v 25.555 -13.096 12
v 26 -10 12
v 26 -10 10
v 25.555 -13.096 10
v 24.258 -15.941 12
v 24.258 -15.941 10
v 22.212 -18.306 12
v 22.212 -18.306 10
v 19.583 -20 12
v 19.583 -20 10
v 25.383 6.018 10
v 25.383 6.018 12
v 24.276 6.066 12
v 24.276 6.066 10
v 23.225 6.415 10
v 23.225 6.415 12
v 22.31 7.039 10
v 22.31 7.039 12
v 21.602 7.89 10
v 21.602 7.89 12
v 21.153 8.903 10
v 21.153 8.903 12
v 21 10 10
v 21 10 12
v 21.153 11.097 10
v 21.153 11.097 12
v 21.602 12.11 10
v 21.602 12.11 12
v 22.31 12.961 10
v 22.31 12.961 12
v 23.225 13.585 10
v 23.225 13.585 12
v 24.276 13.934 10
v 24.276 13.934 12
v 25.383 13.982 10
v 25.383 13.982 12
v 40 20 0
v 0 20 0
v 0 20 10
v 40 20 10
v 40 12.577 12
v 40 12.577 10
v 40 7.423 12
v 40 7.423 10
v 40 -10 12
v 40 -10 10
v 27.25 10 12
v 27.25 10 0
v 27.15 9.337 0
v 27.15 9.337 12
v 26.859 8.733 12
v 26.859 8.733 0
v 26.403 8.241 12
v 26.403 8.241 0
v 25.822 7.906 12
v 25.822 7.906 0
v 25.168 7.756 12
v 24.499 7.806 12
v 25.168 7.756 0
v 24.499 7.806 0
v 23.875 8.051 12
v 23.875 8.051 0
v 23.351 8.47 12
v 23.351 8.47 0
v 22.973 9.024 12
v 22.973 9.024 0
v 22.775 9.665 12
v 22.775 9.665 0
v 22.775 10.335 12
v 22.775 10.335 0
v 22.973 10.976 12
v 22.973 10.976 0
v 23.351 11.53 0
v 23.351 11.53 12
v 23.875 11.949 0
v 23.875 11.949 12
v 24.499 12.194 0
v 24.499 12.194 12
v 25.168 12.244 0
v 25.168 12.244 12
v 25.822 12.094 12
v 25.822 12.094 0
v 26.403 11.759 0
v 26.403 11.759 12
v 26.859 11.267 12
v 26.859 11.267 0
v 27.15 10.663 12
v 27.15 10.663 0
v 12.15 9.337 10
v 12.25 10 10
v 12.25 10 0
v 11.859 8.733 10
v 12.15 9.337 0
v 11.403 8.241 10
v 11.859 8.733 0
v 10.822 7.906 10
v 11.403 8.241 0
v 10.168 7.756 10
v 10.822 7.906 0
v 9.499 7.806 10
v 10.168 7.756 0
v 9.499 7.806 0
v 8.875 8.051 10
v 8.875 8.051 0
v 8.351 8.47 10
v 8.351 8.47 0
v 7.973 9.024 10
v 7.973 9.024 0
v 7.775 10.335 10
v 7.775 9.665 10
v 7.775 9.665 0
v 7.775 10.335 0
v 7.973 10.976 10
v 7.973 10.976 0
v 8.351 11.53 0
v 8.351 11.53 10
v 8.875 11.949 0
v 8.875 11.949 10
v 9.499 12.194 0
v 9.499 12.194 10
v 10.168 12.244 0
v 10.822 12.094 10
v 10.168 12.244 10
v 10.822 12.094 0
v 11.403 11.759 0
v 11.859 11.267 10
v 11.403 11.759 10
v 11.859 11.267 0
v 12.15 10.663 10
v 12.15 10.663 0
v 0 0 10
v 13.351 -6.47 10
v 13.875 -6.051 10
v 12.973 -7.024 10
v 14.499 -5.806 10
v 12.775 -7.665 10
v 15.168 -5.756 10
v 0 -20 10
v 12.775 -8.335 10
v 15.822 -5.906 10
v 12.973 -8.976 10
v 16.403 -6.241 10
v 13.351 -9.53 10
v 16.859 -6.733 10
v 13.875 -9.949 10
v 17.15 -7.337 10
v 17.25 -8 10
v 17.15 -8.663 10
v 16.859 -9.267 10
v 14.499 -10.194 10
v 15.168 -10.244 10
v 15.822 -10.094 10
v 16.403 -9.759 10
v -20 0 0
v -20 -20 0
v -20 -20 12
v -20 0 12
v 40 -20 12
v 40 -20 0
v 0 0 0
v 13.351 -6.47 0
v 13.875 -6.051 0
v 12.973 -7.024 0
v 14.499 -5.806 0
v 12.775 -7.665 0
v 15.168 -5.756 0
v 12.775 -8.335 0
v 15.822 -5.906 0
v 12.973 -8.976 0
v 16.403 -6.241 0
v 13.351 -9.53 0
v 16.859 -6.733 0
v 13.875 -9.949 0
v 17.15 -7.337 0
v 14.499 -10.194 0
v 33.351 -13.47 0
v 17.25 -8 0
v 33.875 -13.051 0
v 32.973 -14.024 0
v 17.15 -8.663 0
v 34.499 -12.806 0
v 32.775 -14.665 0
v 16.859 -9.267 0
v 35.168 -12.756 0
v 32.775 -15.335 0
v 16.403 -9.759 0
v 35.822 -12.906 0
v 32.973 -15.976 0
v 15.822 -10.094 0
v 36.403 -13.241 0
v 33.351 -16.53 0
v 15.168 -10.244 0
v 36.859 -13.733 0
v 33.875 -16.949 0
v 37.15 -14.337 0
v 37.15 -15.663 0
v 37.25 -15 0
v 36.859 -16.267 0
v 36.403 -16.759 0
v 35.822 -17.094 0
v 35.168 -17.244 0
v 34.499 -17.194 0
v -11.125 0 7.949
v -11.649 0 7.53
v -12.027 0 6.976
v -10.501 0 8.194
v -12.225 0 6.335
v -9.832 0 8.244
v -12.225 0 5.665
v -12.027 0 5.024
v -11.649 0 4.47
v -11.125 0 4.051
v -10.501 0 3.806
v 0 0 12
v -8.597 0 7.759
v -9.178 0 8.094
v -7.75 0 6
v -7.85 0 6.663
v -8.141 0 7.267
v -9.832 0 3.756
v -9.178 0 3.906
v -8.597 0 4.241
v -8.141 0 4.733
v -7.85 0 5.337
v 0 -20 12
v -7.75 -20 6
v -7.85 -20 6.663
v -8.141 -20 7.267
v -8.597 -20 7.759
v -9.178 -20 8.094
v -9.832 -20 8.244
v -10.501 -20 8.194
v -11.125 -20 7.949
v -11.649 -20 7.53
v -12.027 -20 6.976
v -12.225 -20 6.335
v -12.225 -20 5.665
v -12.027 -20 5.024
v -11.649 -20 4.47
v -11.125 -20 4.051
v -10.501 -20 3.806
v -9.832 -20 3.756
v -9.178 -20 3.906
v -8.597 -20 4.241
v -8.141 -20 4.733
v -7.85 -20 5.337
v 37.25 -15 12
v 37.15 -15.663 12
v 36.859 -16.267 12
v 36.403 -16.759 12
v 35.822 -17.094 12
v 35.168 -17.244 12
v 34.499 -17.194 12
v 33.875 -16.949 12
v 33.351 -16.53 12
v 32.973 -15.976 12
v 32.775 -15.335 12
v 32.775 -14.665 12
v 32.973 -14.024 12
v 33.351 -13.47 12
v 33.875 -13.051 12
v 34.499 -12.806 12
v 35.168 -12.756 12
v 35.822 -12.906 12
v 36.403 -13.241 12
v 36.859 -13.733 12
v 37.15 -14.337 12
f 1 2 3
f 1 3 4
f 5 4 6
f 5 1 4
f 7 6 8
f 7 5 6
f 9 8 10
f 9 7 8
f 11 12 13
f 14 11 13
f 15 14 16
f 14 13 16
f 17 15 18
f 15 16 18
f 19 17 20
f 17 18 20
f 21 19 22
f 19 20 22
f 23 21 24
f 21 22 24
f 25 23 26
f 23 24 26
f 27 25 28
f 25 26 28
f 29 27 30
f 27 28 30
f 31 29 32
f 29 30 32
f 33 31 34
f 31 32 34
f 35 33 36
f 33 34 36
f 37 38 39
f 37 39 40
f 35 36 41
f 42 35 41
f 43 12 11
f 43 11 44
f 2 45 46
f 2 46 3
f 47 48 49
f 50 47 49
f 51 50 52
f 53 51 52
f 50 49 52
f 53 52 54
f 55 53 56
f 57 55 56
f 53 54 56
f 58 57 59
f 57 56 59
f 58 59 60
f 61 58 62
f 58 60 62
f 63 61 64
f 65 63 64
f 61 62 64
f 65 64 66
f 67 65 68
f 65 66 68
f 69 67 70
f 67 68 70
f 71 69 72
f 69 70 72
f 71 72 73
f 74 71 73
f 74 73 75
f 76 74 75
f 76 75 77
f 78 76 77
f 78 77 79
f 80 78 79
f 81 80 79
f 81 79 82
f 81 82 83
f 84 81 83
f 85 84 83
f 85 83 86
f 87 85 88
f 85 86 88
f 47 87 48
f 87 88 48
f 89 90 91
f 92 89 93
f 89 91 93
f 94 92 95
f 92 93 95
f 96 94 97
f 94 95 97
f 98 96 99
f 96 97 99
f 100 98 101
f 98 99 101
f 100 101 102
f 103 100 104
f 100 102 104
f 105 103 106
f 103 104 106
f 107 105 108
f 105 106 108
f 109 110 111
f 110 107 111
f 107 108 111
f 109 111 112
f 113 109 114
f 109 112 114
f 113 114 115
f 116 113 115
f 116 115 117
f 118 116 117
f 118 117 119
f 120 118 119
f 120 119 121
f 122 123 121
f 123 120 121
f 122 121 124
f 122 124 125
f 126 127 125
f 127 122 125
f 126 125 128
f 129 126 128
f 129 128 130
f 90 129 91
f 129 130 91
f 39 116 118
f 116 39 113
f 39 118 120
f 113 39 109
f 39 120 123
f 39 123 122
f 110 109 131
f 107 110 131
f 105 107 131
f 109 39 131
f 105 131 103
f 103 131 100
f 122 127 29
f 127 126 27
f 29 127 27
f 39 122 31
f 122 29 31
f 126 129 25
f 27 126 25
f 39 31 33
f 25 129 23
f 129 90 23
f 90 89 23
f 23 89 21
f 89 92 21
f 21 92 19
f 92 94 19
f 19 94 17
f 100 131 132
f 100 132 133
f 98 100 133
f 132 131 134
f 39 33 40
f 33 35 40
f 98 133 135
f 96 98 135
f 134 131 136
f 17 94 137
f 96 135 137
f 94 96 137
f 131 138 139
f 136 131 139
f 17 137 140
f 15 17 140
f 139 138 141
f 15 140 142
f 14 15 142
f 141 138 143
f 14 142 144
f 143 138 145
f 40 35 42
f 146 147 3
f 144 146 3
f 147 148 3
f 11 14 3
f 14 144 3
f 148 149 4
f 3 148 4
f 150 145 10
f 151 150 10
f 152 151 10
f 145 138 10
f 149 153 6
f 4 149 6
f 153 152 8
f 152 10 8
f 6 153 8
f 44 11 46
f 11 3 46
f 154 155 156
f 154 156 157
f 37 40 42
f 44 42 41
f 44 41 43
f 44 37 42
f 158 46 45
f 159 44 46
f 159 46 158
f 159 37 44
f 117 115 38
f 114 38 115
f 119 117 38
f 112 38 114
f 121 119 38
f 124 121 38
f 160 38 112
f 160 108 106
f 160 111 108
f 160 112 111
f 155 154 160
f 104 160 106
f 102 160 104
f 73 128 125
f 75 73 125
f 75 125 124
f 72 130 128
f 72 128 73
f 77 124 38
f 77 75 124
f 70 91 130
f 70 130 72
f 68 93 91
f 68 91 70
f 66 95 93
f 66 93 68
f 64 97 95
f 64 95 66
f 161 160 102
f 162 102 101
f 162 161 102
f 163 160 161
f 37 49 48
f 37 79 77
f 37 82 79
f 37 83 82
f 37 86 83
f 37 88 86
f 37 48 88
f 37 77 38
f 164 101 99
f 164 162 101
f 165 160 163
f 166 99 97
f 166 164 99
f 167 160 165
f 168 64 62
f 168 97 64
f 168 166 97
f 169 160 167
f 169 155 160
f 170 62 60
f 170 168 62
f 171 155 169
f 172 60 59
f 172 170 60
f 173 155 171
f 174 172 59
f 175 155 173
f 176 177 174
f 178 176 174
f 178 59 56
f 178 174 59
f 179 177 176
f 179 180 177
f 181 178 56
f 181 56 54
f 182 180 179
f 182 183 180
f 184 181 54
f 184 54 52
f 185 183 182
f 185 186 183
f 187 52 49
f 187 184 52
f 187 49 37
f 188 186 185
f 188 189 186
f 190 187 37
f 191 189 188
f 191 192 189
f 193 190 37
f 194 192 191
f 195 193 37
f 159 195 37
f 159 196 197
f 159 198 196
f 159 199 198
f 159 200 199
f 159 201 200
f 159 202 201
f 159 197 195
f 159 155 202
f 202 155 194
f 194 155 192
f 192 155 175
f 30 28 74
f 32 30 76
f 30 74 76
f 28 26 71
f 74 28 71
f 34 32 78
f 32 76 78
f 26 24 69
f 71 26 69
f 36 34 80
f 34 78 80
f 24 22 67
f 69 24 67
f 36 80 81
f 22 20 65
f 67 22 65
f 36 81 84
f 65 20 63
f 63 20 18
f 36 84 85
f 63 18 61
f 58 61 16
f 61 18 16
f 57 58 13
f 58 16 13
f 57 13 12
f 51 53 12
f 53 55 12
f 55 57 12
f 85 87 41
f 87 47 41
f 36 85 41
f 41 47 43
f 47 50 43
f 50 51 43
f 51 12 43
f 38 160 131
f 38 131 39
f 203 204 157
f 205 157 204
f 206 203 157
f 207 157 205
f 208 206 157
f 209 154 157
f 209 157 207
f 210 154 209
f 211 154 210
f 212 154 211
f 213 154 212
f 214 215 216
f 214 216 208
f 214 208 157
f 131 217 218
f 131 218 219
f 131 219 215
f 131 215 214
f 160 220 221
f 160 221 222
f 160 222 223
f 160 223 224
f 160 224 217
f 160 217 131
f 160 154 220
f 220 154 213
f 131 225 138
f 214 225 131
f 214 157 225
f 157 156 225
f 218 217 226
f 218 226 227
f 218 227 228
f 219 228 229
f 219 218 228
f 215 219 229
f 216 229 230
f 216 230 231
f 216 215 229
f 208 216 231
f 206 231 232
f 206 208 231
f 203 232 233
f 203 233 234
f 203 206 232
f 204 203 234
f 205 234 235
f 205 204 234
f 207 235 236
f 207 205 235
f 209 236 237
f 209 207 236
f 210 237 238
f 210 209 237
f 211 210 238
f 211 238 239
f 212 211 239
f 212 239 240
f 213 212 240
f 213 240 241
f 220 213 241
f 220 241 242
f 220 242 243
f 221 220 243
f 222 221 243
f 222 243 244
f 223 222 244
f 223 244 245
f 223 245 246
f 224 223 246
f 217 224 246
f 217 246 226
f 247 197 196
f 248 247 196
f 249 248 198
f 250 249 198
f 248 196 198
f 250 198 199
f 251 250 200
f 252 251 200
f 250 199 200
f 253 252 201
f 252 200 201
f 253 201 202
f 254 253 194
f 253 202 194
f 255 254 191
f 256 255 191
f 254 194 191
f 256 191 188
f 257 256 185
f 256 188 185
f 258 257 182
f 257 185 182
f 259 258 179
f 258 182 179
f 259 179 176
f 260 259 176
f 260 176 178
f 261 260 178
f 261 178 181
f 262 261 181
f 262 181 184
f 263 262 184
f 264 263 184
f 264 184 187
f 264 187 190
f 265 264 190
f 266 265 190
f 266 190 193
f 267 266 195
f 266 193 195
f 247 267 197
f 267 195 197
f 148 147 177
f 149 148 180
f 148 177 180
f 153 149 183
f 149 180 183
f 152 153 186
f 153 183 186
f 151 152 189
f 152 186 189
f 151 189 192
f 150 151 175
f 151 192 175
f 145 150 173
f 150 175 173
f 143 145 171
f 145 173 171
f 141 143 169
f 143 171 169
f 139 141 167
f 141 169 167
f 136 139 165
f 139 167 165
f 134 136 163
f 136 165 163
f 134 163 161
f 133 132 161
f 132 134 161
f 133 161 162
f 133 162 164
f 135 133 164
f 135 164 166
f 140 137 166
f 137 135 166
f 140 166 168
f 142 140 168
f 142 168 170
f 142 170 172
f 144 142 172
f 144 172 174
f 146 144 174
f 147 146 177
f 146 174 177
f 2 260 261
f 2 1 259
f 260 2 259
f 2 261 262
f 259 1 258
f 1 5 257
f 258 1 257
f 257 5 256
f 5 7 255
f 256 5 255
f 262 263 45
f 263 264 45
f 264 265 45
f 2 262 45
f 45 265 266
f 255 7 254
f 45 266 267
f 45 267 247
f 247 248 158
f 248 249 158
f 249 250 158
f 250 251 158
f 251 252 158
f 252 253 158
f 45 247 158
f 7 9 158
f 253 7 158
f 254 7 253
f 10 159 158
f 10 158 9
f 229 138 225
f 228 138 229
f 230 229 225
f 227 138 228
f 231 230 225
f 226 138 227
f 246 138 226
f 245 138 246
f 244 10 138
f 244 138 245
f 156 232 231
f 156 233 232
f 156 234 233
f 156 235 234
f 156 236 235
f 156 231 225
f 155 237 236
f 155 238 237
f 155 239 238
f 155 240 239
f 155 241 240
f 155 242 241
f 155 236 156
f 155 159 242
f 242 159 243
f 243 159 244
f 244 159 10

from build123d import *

# Parameters (mm, degrees)
SKETCH_R                       = 2.25
PAD_DEPTH                      = 12
POCKET_DEPTH                   = 2
SKETCH002_R                    = 2.25
POCKET002_DEPTH                = 20.001
PART_MIRRORING_PLACEMENT_ANGLE = 180


with BuildPart() as pocket002:
    # Sketch → Pad (new body)
    with BuildSketch(Plane.XY):
        Polygon((0, -20), (40, -20), (40, 20), (-20, 20), (-20, 0), (0, 0), align=None)
        with Locations((15, 8)):
            Circle(SKETCH_R, mode=Mode.SUBTRACT)
        with Locations((10, -10)):
            Circle(SKETCH_R, mode=Mode.SUBTRACT)
        with Locations((35, 15)):
            Circle(SKETCH_R, mode=Mode.SUBTRACT)
        with Locations((25, -10)):
            Circle(SKETCH_R, mode=Mode.SUBTRACT)
    extrude(amount=PAD_DEPTH)

    # Sketch001 → Pocket (cut)
    with BuildSketch(Plane.XY.offset(12)):
        with BuildLine():
            Line((46, 10), (26, 10))
            ThreePointArc((26, 10), (22.778175, 17.778175), (15, 21))
            Line((15, 21), (0, 21))
            Line((0, 21), (0, -23))
            Line((0, -23), (46, -23))
            Line((46, -23), (46, -12))
            Line((25.382674, -13.981653), (46, -12))
            ThreePointArc((25.382674, -6.018347), (21, -10), (25.382674, -13.981653))
            Line((25.382674, -6.018347), (46, -8))
            Line((46, -8), (46, 10))
        make_face()
    extrude(amount=-POCKET_DEPTH, mode=Mode.SUBTRACT)

    # Sketch002 → Pocket002 (cut, through all)
    with BuildSketch(Plane.XZ):
        with Locations((-10, 6)):
            Circle(SKETCH002_R)
    extrude(amount=-POCKET002_DEPTH, mode=Mode.SUBTRACT)


with BuildPart() as idler_block_top:
    # Part__Mirroring: instance of Pocket002
    add(pocket002.part.mirror(Plane(origin=(0, 0, 0), x_dir=(0, 1, 0), z_dir=(0, 0, 1))))


with BuildPart() as idler_block_top_1:
    # Part__Mirroring placement: moved
    add(idler_block_top.part.rotate(Axis((0, 0, 0), (1, 0, 0)), PART_MIRRORING_PLACEMENT_ANGLE))


solid = idler_block_top_1.part
